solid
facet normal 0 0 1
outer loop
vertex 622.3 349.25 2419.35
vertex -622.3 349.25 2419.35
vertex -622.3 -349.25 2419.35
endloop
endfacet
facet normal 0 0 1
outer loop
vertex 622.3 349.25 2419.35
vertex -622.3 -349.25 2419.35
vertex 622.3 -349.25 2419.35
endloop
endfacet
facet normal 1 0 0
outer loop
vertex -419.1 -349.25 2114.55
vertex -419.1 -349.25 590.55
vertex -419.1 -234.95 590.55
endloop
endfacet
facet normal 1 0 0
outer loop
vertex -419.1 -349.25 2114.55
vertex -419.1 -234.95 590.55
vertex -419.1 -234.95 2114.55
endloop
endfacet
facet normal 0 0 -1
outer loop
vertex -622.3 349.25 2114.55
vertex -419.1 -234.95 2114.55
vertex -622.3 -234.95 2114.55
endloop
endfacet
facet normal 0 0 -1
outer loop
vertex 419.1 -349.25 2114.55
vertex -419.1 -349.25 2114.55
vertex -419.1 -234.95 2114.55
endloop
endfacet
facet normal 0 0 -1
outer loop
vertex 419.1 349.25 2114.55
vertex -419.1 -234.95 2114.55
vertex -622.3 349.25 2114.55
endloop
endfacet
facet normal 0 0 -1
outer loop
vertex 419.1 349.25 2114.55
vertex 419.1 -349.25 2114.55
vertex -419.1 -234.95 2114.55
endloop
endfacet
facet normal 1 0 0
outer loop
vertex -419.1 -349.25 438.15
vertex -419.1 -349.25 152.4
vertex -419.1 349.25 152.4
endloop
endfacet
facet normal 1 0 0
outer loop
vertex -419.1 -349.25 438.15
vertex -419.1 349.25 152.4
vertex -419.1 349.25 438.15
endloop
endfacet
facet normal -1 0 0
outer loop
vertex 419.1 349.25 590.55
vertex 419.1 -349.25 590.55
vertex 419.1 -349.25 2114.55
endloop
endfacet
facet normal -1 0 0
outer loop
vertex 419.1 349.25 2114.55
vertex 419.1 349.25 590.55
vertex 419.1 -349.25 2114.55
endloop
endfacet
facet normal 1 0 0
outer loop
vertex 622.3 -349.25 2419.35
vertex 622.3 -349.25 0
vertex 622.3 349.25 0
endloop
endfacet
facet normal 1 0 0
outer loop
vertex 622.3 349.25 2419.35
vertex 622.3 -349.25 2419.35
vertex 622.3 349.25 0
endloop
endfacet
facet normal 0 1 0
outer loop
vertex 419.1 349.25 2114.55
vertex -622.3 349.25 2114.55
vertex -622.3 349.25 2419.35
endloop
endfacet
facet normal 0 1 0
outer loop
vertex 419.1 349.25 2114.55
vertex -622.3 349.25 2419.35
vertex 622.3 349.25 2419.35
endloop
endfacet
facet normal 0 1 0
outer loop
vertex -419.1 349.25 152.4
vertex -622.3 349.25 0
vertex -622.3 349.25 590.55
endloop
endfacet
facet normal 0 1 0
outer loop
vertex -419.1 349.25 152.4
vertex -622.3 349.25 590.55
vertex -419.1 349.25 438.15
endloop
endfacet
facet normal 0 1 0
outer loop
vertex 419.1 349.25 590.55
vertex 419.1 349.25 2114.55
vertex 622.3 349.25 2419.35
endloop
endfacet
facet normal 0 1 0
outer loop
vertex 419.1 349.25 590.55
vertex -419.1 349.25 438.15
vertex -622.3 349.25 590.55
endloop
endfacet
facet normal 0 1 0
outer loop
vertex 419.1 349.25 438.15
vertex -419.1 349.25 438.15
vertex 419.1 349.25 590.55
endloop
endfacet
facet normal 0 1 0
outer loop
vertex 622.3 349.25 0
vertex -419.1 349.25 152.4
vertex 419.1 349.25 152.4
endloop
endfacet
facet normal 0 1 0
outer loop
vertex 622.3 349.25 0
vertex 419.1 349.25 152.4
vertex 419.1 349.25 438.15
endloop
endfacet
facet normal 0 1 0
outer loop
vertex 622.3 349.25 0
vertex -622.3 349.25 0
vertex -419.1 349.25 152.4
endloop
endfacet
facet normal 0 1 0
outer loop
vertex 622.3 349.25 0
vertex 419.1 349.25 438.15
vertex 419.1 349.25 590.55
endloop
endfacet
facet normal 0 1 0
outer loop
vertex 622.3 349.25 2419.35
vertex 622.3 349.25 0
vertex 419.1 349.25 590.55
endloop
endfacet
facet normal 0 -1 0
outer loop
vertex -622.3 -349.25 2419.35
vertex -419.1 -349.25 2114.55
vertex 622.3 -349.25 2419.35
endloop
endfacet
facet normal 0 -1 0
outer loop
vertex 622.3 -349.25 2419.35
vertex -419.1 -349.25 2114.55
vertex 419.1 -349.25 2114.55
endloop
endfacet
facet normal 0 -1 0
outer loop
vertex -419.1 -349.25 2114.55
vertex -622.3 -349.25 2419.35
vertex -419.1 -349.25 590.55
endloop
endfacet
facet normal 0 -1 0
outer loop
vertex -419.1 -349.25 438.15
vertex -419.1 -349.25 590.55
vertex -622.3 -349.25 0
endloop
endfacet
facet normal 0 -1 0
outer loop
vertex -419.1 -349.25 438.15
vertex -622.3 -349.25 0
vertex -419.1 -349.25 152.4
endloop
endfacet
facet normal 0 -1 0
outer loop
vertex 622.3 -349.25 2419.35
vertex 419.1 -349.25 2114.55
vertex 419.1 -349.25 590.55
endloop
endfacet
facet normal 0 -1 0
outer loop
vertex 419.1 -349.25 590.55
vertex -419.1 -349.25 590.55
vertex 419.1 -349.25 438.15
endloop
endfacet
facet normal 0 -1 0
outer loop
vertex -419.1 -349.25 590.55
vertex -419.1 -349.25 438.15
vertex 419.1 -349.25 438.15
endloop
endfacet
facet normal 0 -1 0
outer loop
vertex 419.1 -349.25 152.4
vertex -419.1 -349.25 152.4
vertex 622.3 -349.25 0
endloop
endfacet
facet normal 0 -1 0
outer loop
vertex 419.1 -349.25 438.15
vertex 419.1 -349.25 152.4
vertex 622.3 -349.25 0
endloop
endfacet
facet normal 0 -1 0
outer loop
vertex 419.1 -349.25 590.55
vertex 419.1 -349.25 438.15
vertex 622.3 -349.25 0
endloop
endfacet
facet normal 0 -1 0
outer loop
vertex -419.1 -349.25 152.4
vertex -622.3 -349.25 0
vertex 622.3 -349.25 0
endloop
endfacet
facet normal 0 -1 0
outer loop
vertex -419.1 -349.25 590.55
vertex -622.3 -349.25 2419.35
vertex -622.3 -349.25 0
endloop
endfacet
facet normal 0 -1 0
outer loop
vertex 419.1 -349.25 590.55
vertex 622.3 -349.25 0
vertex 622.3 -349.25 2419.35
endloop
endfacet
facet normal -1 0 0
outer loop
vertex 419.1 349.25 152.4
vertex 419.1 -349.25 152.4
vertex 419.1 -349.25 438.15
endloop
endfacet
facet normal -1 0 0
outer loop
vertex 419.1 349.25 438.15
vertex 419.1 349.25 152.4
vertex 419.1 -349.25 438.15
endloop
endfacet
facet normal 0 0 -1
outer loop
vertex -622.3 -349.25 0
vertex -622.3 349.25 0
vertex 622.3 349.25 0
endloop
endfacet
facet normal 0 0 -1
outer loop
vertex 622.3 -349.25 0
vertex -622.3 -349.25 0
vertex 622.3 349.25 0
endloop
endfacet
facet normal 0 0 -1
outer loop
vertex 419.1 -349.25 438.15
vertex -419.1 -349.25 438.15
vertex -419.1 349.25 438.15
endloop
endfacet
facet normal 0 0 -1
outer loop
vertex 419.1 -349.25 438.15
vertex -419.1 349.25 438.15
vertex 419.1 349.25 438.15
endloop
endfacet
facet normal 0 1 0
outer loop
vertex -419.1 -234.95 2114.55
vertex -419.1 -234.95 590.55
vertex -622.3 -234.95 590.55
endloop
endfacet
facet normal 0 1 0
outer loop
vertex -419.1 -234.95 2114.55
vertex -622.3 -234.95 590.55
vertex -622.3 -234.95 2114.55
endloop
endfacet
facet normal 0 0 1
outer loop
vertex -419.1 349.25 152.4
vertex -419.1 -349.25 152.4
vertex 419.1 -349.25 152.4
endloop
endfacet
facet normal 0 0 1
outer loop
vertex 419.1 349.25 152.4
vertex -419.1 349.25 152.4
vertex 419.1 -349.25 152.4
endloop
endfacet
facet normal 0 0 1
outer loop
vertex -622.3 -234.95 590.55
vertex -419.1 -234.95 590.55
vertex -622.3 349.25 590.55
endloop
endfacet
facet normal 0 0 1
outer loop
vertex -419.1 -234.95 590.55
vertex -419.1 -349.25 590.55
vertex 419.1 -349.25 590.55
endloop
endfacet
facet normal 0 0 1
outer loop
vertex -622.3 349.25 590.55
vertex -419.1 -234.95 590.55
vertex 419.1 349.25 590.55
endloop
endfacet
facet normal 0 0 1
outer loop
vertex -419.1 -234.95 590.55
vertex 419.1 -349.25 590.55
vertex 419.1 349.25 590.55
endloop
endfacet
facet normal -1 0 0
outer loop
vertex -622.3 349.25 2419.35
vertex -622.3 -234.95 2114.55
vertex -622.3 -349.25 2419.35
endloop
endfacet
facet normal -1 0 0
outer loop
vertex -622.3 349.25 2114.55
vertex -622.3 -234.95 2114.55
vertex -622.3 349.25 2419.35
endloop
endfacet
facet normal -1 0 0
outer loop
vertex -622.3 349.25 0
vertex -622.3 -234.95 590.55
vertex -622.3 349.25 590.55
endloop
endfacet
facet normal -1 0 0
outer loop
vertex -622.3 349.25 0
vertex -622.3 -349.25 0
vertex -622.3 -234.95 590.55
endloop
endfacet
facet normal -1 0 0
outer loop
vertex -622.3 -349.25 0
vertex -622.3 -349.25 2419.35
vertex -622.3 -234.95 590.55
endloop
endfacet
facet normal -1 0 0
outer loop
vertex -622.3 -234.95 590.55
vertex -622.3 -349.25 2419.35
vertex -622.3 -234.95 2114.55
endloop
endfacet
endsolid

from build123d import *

# Parameters (mm, degrees)
F0_W     = 1244.6
F0_H     = 698.5
F2_DEPTH = 2419.35
F3_W     = 838.2
F3_H     = 1524
F4_DEPTH = 698.5
F5_W     = 584.2
F5_H     = 1524
F6_DEPTH = 203.2
F7_W     = 838.2
F7_H     = 285.75
F8_DEPTH = 698.5


with BuildPart() as f2:
    # F0 (on Top) → F2 (new body)
    with BuildSketch(Plane.XY):
        Rectangle(F0_W, F0_H)
    extrude(amount=F2_DEPTH)

    # F3 (on face) → F4 (cut)
    with BuildSketch(Plane.XZ.offset(349.25)):
        with Locations((0, 1352.55)):
            Rectangle(F3_W, F3_H)
    extrude(amount=-F4_DEPTH, mode=Mode.SUBTRACT)

    # F5 (on face) → F6 (cut)
    with BuildSketch(Plane.YZ.offset(-419.1)):
        with Locations((57.15, 1352.55)):
            Rectangle(F5_W, F5_H)
    extrude(amount=-F6_DEPTH, mode=Mode.SUBTRACT)

    # F7 (on face) → F8 (cut)
    with BuildSketch(Plane.XZ.offset(349.25)):
        with Locations((0, 295.275)):
            Rectangle(F7_W, F7_H)
    extrude(amount=-F8_DEPTH, mode=Mode.SUBTRACT)


solid = f2.part
